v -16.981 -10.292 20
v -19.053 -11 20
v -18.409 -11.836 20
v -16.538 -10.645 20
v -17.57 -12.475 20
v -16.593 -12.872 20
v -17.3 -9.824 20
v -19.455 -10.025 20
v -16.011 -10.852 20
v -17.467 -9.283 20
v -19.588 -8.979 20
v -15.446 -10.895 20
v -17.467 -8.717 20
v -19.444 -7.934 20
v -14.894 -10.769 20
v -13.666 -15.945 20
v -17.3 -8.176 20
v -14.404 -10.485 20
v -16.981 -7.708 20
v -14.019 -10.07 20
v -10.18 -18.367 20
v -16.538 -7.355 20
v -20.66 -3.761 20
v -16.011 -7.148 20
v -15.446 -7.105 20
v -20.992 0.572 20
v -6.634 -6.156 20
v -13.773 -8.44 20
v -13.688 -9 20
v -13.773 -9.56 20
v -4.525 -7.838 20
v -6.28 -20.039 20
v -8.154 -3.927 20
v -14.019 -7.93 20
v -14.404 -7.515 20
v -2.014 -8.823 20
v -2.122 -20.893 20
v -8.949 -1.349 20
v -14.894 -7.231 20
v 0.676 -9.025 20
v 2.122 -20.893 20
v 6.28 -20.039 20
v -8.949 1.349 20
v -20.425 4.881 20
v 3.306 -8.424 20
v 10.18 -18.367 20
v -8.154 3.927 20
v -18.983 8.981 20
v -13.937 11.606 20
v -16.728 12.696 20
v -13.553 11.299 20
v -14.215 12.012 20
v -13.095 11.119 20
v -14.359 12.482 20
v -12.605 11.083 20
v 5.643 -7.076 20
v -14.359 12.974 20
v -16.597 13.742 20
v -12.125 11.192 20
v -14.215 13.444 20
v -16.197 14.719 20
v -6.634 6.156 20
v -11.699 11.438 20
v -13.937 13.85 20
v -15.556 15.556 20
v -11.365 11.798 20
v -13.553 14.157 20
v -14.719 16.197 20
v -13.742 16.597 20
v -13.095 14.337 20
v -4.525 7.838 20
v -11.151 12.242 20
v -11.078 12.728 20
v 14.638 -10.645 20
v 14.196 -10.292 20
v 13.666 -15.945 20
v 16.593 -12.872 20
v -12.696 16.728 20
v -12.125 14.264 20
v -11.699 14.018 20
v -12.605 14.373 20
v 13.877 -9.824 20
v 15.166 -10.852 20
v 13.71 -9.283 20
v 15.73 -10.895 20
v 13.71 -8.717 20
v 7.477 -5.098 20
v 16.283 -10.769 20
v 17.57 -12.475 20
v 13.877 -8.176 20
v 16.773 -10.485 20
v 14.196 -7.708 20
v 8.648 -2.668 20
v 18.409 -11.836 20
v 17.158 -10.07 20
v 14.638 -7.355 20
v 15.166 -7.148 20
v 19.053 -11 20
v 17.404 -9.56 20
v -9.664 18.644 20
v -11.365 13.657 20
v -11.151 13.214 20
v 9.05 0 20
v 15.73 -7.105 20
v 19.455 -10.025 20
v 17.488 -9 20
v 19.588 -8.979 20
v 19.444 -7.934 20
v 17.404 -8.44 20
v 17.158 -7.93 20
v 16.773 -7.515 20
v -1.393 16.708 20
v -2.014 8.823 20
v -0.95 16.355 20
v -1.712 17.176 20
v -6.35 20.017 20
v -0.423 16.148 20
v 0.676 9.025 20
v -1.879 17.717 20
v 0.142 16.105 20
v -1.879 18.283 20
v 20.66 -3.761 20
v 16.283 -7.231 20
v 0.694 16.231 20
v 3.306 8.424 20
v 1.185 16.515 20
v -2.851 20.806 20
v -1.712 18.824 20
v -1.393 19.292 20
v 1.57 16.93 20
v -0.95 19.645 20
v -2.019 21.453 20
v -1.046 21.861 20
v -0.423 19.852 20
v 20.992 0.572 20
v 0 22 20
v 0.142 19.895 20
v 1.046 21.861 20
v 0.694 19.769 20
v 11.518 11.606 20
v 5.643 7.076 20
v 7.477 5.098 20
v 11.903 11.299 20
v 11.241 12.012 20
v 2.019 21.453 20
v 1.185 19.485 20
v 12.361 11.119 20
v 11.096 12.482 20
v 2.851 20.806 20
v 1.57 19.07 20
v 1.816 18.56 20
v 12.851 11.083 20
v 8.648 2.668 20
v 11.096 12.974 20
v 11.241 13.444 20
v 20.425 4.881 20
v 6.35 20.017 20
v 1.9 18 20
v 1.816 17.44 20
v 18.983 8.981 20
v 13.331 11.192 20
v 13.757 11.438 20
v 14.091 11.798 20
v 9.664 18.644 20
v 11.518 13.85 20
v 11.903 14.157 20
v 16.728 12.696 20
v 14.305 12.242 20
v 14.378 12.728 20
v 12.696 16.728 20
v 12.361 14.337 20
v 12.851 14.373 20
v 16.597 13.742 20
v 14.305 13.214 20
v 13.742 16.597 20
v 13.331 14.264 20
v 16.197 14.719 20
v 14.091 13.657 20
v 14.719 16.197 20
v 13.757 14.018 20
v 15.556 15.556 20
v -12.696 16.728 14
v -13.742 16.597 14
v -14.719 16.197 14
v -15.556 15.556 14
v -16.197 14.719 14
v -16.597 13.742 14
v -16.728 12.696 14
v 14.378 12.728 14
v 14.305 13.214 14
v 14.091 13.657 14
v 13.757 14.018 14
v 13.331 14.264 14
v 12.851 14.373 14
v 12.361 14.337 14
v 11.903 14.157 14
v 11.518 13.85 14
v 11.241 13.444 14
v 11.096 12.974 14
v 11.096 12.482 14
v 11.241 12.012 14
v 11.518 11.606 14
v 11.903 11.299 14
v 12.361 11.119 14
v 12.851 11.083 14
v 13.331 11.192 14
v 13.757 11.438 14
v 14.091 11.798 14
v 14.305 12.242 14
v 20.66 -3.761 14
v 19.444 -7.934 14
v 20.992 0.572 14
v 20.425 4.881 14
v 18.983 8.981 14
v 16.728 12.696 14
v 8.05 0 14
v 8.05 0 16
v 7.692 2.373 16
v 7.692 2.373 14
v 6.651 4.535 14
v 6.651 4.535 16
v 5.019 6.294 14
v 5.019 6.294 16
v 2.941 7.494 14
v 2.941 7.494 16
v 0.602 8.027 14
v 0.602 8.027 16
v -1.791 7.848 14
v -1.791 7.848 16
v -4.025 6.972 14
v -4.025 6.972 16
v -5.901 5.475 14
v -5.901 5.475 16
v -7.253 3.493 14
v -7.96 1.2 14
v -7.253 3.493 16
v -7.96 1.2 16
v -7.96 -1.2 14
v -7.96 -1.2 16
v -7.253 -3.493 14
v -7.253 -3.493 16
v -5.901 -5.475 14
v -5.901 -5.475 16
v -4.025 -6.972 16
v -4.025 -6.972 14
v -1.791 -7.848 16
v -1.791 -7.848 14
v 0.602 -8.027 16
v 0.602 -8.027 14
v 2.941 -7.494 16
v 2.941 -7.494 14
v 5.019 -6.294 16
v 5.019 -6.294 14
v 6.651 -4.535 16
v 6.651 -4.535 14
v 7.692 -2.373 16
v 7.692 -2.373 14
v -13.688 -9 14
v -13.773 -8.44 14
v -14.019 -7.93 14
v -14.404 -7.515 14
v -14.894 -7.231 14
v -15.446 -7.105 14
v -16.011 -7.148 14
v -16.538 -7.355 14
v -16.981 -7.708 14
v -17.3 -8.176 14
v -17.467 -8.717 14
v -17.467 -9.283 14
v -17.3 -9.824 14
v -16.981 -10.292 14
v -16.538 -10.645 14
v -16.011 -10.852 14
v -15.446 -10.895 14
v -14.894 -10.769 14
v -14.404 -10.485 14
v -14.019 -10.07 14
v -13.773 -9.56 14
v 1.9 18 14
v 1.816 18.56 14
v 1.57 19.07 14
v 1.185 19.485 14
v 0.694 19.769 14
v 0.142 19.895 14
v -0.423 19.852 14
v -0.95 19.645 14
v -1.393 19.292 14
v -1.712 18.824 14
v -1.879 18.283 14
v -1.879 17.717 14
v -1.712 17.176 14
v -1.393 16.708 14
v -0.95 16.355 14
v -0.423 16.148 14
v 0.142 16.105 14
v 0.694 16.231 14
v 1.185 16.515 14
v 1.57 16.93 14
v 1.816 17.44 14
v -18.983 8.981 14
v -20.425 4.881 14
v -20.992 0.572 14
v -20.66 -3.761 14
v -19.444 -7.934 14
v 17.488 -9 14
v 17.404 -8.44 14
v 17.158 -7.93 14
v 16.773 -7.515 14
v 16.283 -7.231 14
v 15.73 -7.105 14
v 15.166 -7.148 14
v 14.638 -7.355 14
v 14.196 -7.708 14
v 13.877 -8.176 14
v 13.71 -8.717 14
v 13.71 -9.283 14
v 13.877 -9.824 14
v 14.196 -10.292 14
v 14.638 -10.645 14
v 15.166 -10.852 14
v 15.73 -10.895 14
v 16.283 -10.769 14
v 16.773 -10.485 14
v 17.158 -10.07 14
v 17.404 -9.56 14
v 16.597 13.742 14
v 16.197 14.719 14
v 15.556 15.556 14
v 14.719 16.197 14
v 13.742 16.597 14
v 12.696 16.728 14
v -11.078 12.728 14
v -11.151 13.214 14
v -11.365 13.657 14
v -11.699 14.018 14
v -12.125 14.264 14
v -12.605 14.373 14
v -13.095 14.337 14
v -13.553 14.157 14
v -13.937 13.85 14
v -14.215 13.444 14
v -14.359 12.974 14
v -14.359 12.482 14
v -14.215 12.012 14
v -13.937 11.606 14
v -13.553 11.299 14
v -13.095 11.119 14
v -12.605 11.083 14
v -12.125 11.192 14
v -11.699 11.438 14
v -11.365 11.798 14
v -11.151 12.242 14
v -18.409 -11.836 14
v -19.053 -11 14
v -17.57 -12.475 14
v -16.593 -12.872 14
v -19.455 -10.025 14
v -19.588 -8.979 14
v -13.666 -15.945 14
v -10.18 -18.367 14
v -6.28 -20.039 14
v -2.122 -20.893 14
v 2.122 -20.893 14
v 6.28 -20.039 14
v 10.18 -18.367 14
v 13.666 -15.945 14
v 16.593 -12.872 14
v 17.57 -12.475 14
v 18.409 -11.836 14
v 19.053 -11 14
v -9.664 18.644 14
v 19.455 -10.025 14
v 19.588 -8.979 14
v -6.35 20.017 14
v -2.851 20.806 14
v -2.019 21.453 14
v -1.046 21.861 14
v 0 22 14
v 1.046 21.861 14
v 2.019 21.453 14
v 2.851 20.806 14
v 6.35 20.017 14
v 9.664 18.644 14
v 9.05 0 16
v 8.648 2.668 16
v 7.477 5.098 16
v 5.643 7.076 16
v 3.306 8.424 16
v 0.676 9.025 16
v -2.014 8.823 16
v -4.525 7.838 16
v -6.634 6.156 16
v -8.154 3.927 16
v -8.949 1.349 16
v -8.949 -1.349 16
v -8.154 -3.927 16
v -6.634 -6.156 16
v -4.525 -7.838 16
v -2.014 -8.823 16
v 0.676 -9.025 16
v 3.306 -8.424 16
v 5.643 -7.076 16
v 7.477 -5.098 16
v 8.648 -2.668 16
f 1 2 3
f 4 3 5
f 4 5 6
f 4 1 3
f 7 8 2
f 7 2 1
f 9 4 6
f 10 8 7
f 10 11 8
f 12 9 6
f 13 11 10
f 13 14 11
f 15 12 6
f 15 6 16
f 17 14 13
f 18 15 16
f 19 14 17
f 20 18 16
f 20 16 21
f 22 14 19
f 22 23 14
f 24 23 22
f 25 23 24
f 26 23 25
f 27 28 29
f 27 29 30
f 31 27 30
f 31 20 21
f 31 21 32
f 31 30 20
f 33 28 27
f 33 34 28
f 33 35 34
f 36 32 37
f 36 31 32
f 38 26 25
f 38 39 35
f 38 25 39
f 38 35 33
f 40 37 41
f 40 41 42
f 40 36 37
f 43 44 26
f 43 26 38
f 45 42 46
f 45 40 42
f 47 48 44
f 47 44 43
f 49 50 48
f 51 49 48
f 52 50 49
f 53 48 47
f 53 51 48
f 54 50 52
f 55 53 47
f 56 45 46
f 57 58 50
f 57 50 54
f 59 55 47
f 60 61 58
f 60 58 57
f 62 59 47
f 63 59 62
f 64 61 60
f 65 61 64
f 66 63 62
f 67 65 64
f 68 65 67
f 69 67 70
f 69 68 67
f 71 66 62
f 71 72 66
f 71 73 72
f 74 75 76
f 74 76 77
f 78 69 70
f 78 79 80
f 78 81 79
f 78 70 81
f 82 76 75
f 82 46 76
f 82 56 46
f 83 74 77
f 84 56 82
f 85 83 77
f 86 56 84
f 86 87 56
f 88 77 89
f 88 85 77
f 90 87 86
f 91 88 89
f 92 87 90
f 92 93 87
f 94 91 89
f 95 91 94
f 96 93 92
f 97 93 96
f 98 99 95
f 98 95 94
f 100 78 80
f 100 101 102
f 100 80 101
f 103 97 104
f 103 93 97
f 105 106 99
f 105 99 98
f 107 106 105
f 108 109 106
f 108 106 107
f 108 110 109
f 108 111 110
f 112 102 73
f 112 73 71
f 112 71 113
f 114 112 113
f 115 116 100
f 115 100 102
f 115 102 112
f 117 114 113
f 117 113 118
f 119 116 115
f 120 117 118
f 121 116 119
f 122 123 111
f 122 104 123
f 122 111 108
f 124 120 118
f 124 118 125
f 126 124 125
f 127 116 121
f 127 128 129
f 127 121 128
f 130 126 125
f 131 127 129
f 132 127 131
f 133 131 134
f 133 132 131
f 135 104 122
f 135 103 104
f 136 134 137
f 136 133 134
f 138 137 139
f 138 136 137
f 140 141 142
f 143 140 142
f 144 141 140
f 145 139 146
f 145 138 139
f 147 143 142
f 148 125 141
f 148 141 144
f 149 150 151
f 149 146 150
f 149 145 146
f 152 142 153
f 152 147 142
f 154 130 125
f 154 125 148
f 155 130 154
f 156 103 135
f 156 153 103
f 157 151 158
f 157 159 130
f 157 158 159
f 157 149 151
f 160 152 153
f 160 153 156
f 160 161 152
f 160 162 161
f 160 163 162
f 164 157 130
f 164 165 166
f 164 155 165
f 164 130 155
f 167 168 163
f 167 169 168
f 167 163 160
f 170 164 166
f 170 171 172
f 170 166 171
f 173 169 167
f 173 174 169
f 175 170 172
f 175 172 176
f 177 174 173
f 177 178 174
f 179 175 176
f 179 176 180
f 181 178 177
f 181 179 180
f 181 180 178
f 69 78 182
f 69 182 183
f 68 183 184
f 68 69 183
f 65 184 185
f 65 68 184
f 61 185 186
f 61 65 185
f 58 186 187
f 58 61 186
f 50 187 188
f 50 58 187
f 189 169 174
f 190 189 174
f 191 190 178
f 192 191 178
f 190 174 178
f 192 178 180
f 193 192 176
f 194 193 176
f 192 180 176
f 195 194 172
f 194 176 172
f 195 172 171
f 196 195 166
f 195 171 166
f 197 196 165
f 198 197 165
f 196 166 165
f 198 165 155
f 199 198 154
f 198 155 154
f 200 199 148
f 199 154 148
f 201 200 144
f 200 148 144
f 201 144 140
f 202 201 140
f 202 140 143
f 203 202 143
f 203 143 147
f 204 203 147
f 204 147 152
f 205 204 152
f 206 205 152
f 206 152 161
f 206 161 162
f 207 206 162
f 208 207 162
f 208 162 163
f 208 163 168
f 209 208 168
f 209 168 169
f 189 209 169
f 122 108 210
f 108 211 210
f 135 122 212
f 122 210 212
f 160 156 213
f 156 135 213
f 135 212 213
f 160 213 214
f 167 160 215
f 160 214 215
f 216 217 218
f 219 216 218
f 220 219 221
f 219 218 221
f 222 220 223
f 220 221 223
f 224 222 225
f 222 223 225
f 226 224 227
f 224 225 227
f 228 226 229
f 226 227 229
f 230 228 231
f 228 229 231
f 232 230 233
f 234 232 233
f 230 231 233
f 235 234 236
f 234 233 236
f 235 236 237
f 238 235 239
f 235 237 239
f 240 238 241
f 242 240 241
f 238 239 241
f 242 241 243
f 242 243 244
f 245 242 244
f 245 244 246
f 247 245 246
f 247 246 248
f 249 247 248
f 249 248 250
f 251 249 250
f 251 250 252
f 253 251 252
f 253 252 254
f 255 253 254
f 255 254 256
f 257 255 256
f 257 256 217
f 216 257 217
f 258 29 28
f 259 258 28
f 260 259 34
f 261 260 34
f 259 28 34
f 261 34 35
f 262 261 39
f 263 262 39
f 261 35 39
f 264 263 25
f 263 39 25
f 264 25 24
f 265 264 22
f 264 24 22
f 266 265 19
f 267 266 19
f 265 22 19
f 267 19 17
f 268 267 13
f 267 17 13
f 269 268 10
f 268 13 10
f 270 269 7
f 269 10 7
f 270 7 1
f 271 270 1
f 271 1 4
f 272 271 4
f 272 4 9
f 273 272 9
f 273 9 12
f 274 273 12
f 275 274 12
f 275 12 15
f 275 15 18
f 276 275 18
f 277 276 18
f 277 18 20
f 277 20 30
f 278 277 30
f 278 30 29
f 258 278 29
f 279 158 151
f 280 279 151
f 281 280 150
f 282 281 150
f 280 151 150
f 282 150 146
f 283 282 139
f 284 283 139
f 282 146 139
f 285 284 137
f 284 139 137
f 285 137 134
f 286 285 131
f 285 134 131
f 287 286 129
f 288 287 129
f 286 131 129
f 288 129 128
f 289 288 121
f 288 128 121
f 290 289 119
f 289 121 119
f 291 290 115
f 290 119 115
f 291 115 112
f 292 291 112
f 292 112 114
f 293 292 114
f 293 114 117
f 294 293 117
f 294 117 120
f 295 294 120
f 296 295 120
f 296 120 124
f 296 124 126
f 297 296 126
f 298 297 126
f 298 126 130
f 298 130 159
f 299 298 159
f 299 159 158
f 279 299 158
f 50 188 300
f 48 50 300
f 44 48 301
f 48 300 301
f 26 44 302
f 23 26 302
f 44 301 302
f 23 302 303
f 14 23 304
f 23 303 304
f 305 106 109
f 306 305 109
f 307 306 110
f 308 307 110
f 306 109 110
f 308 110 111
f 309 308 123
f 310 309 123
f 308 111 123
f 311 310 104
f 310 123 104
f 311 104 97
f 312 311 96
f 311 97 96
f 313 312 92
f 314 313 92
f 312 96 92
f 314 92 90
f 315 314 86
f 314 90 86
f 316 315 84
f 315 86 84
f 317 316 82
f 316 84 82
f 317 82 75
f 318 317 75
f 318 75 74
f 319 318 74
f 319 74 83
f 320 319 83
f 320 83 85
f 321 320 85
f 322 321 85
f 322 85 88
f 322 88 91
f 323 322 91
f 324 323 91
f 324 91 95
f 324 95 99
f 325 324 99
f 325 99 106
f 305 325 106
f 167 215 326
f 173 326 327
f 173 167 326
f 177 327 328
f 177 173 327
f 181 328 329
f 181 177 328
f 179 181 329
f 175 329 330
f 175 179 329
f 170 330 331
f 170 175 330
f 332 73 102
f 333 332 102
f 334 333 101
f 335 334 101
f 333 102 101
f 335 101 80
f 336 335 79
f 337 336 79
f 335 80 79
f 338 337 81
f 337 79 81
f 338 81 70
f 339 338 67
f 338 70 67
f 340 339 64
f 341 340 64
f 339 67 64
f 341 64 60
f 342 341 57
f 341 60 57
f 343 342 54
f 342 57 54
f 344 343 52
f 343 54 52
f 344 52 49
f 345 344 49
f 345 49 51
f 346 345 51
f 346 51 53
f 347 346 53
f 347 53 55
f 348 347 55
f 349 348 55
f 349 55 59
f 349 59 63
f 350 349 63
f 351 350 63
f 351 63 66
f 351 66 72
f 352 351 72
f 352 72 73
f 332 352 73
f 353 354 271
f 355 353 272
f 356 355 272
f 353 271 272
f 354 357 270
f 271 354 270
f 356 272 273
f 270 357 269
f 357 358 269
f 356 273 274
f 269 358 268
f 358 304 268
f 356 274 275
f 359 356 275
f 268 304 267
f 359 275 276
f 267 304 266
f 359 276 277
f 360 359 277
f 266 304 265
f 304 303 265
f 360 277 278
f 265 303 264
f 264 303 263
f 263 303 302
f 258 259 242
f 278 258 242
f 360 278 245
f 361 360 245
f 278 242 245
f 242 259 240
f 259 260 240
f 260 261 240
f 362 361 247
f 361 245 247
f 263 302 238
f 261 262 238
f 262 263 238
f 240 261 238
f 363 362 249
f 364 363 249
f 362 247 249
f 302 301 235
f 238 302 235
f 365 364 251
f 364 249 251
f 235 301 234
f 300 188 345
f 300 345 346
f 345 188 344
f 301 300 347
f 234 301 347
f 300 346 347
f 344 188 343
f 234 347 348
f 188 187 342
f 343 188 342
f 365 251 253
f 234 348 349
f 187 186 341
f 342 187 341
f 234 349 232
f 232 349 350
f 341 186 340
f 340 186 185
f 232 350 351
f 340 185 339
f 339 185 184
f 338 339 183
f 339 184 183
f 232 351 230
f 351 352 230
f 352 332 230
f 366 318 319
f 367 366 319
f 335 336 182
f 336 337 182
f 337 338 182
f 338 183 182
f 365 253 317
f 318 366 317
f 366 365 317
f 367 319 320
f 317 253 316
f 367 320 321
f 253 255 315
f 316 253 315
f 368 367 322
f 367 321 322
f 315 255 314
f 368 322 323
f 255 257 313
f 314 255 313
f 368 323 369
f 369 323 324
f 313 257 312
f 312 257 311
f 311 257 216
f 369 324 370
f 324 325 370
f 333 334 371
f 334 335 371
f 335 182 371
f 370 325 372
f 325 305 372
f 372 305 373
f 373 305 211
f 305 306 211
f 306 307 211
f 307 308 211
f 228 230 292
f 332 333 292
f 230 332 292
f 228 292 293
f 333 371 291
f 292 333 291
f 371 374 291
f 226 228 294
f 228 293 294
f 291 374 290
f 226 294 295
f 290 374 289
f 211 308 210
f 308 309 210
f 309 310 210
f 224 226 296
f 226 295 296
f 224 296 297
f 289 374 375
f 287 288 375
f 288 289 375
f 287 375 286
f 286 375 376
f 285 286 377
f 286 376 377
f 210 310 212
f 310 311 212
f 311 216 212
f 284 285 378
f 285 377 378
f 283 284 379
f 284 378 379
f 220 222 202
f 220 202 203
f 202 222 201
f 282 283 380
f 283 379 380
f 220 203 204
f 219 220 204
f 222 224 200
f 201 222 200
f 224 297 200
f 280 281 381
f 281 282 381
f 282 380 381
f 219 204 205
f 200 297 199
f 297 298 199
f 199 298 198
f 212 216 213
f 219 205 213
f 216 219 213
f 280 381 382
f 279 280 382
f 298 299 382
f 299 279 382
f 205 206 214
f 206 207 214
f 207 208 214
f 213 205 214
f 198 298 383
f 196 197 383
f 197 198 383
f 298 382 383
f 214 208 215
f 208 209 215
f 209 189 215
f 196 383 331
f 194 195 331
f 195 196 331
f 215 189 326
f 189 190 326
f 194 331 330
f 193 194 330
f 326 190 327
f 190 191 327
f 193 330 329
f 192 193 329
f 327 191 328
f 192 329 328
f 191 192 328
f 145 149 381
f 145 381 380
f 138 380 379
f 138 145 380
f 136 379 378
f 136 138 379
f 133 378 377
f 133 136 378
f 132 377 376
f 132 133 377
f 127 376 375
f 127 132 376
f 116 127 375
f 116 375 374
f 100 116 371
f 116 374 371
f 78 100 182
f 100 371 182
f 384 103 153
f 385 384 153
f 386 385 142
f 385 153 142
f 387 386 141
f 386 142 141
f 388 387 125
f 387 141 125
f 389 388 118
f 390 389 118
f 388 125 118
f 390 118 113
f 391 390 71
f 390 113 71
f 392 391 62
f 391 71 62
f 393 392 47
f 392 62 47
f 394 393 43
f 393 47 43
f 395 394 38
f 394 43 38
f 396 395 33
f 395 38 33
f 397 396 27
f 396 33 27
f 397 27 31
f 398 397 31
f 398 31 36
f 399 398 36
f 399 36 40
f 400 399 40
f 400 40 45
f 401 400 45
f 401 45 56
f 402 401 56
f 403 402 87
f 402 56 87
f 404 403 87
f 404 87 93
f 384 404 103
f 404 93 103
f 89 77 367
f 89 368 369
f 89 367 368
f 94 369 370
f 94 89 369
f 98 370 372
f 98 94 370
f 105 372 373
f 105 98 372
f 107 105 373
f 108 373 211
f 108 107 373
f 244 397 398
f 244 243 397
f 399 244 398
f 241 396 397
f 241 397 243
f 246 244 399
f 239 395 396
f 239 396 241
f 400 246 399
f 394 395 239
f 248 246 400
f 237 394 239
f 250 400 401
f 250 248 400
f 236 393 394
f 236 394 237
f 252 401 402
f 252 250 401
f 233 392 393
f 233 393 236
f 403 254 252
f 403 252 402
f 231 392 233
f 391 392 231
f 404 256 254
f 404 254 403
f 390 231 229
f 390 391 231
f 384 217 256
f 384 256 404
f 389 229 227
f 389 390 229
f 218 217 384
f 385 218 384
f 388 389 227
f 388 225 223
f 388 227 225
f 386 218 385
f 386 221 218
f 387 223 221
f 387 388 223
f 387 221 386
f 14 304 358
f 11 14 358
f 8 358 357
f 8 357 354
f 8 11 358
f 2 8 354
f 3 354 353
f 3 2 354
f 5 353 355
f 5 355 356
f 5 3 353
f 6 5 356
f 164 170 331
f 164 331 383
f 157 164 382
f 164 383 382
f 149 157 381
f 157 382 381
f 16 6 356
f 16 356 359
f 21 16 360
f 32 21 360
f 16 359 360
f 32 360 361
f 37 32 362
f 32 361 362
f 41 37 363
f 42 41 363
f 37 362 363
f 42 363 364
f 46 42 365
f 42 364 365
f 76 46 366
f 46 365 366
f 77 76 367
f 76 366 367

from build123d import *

# Parameters (mm, degrees)
SKETCH009_R     = 21
PAD002_DEPTH    = 6
SKETCH010_R     = 4
PAD003_DEPTH    = 6
SKETCH011_R     = 1.65
SKETCH011_R_2   = 1.9
POCKET007_DEPTH = 6.001
SKETCH012_R     = 9.05
POCKET008_DEPTH = 4
SKETCH013_R     = 8.05
POCKET009_DEPTH = 6.001


with BuildPart() as part:
    # Sketch009 → Pad002 (new body)
    with BuildSketch(Plane.XY):
        Circle(SKETCH009_R)
    extrude(amount=PAD002_DEPTH)

    # Sketch010 (on DatumPlane) → Pad003 (join)
    with BuildSketch(Plane.XY.offset(6)):
        with Locations((-12.727922, 12.727922)):
            Circle(SKETCH010_R)
        with Locations((0, 18)):
            Circle(SKETCH010_R)
        with Locations((12.727922, 12.727922)):
            Circle(SKETCH010_R)
        with Locations((15.588457, -9)):
            Circle(SKETCH010_R)
        with Locations((-15.588457, -9)):
            Circle(SKETCH010_R)
    extrude(amount=-PAD003_DEPTH)

    # Sketch011 (on DatumPlane) → Pocket007 (cut, through all)
    with BuildSketch(Plane.XY.offset(6)):
        with Locations((-12.727922, 12.727922)):
            Circle(SKETCH011_R)
        with Locations((0, 18)):
            Circle(SKETCH011_R_2)
        with Locations((12.727922, 12.727922)):
            Circle(SKETCH011_R)
        with Locations((-15.588457, -9)):
            Circle(SKETCH011_R_2)
        with Locations((15.588457, -9)):
            Circle(SKETCH011_R_2)
    extrude(amount=-POCKET007_DEPTH, mode=Mode.SUBTRACT)

    # Sketch012 (on DatumPlane) → Pocket008 (cut)
    with BuildSketch(Plane.XY.offset(6)):
        Circle(SKETCH012_R)
    extrude(amount=-POCKET008_DEPTH, mode=Mode.SUBTRACT)

    # Sketch013 (on DatumPlane) → Pocket009 (cut, through all)
    with BuildSketch(Plane.XY.offset(6)):
        Circle(SKETCH013_R)
    extrude(amount=-POCKET009_DEPTH, mode=Mode.SUBTRACT)


with BuildPart() as part_1:
    # Body001 placement: moved
    add(part.part.moved(Location((0, 0, 14))))


solid = part_1.part
